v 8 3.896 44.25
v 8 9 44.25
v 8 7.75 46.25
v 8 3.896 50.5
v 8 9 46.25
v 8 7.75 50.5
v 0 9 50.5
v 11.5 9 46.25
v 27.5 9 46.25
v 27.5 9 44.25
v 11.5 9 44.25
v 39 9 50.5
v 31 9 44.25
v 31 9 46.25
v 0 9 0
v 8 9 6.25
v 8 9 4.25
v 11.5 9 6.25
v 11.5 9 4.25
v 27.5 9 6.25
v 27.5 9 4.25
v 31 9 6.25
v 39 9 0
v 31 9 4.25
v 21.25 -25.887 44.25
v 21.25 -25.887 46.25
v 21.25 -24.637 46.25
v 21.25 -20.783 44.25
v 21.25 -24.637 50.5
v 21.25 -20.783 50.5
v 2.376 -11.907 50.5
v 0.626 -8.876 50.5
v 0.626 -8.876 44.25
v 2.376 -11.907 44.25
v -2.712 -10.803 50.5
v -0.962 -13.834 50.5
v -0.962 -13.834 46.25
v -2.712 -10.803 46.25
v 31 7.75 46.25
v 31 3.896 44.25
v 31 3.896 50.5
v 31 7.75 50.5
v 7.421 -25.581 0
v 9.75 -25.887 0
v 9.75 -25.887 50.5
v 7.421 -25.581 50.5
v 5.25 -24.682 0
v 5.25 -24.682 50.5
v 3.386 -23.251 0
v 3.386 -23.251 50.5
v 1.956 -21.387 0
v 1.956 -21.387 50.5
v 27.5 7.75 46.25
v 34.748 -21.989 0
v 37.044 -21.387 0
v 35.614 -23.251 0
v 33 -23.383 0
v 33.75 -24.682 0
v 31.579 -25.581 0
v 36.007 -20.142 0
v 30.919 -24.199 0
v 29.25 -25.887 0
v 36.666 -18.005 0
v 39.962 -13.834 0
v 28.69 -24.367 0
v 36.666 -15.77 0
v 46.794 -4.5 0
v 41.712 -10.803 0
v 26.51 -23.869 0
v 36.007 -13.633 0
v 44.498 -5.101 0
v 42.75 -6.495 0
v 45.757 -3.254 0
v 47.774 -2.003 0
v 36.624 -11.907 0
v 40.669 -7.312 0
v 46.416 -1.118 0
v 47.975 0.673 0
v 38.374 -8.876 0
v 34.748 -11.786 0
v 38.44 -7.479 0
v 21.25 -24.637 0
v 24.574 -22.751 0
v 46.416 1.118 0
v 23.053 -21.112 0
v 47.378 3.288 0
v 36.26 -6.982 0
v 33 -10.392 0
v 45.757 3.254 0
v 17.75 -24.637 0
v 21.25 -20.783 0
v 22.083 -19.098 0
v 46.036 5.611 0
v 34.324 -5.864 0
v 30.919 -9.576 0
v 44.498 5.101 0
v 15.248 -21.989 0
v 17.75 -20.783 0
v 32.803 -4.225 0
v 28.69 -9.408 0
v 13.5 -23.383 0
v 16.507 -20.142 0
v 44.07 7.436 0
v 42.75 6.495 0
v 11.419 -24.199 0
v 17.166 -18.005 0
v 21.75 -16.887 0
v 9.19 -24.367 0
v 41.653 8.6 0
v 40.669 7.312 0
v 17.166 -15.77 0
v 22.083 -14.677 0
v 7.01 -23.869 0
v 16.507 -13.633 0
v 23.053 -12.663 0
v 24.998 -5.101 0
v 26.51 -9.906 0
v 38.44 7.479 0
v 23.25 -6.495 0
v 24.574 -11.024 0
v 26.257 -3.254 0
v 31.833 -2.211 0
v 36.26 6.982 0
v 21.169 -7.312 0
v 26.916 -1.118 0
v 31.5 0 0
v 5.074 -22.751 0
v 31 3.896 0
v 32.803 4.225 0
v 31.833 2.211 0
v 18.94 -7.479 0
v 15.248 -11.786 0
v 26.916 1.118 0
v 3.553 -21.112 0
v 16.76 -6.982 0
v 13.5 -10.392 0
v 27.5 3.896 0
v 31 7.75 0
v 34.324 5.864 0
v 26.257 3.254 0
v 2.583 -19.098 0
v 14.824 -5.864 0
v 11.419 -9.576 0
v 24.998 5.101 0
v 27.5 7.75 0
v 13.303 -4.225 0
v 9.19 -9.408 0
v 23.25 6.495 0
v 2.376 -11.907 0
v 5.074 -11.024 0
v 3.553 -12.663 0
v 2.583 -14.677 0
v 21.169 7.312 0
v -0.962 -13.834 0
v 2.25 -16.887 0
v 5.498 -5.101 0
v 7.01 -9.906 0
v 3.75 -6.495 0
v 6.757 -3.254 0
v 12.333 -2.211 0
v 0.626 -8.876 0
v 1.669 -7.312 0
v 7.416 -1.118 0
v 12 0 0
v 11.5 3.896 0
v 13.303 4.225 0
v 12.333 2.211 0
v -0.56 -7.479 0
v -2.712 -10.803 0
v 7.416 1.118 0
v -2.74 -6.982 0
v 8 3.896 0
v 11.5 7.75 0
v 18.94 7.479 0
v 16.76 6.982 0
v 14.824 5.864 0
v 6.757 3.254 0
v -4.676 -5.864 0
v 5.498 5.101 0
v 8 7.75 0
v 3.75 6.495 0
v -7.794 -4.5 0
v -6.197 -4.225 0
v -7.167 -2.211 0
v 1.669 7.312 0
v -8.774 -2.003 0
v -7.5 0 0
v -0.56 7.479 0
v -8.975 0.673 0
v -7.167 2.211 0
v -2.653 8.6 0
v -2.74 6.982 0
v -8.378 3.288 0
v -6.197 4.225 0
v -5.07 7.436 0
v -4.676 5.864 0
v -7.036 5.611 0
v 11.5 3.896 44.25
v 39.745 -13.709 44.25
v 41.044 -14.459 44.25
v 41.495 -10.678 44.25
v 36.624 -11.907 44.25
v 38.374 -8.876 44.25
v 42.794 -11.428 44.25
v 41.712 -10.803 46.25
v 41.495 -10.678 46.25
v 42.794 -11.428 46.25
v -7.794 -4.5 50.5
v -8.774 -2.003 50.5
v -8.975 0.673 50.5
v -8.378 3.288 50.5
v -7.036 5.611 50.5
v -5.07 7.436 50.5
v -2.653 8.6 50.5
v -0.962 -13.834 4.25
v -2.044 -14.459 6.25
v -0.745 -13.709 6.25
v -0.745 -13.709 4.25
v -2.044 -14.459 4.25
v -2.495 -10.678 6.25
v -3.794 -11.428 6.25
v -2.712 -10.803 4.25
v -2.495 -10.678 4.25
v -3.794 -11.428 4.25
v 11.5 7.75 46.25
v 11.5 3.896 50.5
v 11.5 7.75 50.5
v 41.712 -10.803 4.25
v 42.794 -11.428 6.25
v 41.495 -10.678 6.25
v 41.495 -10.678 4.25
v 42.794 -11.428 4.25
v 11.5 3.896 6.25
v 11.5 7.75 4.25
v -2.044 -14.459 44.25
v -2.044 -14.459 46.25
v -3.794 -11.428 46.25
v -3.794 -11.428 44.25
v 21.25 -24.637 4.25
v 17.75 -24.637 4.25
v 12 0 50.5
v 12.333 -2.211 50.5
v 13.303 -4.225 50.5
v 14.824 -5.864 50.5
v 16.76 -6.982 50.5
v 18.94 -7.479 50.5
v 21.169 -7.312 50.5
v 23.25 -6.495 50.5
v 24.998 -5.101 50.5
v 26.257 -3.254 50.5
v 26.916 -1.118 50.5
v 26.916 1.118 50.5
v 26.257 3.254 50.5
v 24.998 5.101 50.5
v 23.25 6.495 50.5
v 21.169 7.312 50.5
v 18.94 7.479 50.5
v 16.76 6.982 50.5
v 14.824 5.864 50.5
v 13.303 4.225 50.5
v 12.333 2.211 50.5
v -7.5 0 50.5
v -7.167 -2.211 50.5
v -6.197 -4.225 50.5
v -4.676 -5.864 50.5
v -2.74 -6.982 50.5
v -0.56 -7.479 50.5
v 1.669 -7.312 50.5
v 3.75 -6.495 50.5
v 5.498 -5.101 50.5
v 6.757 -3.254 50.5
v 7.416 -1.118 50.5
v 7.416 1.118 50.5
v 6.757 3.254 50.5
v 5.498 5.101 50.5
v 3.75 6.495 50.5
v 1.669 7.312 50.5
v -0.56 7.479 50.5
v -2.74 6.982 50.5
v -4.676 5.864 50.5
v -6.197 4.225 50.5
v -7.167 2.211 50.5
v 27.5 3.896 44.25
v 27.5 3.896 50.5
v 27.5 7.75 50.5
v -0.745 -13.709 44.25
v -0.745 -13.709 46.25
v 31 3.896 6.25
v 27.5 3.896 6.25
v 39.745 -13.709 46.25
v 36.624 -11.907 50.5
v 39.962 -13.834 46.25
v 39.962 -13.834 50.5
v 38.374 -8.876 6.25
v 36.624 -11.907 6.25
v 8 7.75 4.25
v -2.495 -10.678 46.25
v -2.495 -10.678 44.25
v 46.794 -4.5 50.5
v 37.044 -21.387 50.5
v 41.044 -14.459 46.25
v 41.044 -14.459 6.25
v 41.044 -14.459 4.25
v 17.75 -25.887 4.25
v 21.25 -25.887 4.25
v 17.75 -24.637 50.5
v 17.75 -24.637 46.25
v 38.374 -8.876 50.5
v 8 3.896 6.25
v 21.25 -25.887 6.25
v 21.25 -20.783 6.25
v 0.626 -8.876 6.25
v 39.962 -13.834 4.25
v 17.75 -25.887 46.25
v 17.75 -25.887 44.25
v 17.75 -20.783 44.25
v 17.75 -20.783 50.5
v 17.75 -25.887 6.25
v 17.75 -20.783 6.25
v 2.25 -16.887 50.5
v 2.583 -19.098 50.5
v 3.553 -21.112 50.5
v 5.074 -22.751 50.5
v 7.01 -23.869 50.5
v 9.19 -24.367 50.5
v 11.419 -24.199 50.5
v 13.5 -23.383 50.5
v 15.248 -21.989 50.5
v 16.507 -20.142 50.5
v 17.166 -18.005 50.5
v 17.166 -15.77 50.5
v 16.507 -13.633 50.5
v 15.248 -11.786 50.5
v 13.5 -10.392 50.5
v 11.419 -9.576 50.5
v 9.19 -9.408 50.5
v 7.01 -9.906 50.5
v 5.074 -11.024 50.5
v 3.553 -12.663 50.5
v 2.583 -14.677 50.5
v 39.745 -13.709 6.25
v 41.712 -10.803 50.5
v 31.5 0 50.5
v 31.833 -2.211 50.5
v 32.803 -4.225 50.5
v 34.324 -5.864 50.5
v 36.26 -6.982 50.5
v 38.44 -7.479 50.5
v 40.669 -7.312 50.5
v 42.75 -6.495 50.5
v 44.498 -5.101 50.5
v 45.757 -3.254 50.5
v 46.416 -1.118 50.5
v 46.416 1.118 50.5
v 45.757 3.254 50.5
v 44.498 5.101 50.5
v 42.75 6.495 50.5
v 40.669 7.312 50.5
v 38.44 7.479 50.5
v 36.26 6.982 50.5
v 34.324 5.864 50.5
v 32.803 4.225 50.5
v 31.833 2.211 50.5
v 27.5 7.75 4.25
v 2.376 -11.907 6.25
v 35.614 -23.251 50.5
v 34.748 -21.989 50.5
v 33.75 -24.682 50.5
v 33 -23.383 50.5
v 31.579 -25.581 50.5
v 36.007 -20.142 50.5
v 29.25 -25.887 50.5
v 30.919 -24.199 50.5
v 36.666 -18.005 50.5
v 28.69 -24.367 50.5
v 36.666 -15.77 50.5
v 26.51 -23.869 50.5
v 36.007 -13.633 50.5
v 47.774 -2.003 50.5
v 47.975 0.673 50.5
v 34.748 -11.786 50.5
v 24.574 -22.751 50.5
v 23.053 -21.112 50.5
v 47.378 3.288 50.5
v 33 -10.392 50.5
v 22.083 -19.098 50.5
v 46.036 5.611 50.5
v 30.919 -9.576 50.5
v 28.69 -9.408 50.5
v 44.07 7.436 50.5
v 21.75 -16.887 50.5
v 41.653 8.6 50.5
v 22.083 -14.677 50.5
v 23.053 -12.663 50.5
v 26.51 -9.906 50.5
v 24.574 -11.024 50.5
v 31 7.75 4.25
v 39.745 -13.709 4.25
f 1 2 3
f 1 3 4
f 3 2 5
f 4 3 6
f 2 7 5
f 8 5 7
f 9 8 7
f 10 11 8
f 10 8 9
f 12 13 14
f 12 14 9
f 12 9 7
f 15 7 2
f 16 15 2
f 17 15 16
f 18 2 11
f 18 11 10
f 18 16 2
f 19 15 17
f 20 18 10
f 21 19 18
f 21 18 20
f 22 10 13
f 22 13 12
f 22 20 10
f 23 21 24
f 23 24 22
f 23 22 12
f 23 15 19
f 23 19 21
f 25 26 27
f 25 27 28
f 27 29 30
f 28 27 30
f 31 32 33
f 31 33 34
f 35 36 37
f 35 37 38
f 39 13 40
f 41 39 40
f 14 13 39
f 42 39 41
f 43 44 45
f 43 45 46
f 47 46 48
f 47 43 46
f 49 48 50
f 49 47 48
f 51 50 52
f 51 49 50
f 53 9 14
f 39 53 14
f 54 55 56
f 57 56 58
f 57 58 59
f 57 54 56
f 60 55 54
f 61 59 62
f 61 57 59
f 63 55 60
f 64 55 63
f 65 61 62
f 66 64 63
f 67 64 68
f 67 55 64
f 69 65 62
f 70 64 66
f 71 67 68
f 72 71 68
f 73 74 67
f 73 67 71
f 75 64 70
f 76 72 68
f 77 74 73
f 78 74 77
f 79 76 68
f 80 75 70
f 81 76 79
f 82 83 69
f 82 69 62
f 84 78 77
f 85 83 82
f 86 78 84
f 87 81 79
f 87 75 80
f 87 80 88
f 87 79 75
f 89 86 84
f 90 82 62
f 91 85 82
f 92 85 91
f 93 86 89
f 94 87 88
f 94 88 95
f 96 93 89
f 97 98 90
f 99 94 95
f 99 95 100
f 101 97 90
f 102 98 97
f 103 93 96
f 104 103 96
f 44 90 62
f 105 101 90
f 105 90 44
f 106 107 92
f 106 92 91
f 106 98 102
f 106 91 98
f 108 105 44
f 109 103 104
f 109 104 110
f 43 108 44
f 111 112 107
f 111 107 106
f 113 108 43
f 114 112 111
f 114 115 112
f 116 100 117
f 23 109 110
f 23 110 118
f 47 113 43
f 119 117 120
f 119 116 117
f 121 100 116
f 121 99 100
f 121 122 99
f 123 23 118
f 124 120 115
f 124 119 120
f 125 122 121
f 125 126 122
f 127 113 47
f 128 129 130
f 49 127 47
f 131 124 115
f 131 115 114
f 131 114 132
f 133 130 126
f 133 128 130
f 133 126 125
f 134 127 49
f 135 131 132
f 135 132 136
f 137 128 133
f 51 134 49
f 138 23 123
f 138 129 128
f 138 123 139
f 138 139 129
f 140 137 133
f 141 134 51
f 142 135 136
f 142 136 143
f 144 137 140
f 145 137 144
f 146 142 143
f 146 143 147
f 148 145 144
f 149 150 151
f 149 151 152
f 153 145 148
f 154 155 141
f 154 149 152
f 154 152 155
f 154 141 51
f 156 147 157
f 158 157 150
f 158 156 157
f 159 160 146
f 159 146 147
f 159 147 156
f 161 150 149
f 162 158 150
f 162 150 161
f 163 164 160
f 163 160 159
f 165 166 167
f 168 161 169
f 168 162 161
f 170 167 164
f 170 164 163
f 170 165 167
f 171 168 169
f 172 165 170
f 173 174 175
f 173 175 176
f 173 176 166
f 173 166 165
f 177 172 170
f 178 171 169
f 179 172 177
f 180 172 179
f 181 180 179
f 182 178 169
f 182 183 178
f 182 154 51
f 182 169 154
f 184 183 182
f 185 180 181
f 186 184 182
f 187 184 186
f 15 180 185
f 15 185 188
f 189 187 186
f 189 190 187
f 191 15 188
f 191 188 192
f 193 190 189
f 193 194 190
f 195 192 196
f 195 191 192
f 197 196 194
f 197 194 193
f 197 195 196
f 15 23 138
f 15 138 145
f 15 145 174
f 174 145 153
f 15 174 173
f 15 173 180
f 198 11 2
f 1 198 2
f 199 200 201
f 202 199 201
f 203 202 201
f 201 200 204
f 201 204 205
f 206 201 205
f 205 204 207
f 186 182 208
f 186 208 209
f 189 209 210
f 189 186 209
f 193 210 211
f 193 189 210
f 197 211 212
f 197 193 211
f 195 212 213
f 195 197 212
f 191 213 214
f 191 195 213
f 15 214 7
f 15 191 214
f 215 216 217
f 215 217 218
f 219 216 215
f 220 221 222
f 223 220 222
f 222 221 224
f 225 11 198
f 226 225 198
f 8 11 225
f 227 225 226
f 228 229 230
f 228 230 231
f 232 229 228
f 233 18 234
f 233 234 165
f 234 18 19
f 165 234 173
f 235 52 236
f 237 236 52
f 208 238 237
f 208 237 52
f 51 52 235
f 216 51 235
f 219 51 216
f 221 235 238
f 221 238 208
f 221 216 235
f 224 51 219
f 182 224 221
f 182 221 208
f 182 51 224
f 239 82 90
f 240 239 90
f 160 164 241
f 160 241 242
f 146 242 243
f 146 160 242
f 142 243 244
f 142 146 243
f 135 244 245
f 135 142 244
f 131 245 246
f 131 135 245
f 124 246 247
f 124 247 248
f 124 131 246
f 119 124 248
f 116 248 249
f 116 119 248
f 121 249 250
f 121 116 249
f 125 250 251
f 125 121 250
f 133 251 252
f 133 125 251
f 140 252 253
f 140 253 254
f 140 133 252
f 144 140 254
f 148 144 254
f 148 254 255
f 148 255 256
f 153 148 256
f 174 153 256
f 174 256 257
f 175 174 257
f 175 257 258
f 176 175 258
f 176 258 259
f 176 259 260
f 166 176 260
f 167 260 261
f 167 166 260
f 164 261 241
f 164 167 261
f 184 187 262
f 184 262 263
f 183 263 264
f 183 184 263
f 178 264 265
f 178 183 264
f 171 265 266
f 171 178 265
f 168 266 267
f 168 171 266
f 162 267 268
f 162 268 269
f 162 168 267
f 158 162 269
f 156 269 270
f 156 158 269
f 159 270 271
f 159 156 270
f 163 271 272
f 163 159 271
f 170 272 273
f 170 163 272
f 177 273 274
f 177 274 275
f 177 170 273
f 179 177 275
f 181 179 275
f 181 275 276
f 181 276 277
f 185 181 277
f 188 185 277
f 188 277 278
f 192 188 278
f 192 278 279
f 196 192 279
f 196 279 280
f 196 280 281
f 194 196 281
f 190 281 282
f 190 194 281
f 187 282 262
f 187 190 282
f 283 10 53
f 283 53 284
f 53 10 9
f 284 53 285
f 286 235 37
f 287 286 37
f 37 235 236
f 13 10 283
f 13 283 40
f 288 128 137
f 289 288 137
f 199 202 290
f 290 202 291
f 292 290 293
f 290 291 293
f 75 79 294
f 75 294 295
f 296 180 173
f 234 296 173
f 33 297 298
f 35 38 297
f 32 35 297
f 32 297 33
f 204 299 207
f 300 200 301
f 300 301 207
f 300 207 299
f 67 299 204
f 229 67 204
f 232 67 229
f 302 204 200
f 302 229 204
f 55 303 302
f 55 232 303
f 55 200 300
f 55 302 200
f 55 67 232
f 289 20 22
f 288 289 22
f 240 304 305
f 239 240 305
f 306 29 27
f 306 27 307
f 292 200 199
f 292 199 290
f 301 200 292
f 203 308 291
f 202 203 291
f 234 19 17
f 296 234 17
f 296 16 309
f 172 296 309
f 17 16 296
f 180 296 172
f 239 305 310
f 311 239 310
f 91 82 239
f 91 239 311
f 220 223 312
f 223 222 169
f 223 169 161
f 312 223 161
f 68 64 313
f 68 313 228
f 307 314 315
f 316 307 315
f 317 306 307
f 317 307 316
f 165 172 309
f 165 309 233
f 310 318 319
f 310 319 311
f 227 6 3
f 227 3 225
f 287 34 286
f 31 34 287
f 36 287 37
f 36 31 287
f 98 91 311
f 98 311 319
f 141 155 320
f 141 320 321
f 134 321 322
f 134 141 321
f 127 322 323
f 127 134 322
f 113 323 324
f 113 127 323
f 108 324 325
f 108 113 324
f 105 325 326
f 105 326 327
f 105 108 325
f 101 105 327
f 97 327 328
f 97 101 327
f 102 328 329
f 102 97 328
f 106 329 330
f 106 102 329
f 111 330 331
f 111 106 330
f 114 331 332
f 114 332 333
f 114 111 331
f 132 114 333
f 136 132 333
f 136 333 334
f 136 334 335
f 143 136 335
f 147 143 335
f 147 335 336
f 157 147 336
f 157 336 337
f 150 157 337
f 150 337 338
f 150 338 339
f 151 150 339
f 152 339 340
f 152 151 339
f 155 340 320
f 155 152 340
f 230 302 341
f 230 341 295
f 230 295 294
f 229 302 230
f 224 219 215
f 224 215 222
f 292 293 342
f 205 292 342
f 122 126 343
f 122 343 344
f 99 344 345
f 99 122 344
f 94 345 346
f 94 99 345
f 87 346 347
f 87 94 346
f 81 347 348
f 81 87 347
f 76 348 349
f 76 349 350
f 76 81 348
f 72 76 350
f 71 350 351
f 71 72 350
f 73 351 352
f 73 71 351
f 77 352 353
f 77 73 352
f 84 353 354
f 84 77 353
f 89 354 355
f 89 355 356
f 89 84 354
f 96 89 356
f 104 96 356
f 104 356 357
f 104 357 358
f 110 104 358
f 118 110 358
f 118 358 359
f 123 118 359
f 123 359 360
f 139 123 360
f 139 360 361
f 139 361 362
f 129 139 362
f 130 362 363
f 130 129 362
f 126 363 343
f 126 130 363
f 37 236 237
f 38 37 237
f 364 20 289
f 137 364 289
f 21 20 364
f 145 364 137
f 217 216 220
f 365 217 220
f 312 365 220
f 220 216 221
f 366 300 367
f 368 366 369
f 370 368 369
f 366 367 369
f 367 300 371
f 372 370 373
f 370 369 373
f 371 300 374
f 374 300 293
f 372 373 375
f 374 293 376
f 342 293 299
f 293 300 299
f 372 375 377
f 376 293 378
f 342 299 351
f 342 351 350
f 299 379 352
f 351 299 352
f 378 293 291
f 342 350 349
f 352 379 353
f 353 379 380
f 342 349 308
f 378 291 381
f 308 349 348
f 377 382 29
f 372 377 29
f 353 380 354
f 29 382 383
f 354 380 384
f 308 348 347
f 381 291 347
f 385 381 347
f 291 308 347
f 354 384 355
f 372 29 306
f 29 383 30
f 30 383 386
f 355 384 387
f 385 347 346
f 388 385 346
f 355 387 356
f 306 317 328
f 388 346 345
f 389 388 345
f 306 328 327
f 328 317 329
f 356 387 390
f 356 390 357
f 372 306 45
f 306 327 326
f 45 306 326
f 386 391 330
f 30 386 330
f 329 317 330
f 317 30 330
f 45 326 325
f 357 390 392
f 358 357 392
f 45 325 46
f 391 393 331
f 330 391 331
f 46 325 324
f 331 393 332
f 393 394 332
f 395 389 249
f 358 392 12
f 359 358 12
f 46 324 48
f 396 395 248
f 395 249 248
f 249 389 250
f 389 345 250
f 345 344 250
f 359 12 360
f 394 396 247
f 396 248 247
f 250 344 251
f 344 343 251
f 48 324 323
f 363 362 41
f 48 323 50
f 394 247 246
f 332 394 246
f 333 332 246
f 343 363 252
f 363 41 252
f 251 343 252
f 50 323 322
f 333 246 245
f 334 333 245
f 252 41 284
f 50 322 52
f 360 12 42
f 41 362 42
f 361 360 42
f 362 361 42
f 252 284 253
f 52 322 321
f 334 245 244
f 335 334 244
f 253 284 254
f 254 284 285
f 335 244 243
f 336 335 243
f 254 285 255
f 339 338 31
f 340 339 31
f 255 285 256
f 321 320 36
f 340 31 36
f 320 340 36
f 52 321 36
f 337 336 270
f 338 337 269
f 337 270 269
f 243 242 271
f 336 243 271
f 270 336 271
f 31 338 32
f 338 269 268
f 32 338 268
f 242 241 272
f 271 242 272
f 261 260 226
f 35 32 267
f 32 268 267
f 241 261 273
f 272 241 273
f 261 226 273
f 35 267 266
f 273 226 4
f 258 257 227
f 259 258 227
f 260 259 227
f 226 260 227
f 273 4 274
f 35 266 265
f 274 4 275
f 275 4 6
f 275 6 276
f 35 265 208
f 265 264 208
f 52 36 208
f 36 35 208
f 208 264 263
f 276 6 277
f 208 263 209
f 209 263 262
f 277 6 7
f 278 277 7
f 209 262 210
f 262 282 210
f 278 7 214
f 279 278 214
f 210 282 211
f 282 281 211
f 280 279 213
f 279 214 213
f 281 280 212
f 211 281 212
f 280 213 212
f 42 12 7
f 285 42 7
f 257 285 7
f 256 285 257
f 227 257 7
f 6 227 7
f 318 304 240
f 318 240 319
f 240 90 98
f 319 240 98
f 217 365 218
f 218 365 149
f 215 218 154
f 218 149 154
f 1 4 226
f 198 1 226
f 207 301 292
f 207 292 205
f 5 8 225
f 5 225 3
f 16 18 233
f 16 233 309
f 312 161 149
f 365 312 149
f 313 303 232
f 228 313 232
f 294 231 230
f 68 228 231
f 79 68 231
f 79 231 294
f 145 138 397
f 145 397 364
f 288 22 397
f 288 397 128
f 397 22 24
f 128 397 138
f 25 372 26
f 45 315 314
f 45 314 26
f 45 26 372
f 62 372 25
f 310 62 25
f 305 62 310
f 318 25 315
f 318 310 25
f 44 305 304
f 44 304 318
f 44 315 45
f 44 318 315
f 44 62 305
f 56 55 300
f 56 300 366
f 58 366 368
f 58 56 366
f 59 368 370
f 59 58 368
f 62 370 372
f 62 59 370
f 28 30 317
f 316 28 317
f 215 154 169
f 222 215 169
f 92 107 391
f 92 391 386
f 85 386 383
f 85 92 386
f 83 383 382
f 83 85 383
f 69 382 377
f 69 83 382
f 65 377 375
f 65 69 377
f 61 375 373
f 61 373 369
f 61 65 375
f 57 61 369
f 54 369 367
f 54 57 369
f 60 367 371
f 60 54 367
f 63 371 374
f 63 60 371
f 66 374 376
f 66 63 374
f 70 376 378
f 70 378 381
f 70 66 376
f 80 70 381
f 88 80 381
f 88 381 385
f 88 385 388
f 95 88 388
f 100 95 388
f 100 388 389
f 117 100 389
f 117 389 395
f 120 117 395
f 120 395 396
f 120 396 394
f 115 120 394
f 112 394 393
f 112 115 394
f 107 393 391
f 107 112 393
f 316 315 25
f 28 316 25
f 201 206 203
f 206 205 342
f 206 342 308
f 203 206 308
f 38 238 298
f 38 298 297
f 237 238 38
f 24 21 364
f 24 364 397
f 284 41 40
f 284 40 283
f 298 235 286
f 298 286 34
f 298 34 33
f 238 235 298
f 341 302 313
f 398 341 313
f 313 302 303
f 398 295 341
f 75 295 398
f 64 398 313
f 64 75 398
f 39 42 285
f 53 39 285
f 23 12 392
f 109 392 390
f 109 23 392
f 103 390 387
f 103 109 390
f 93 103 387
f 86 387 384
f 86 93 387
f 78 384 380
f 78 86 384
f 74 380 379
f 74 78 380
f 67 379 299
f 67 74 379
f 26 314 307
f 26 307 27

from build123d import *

# Parameters (mm, degrees)
SKETCH1_R               = 7.5
BOSS_EXTRUDE1_DEPTH     = 50.5
SKETCH2_W               = 2
SKETCH2_H               = 3.5
CUT_EXTRUDE1_DEPTH      = 1.5
SKETCH3_W               = 3.5
SKETCH3_H               = 2
CUT_EXTRUDE2_DEPTH      = 1.5
SKETCH4_W               = 3.5
SKETCH4_H               = 2
CUT_EXTRUDE3_DEPTH      = 1.5
SKETCH5_W               = 3.5
SKETCH5_H               = 3.854101966
CUT_EXTRUDE4_DEPTH      = 6.25
MIRROR3_COPY_1_SKETCH_W = 2
MIRROR3_COPY_1_SKETCH_H = 3.5
MIRROR3_COPY_1_DEPTH    = 1.5
MIRROR3_COPY_2_SKETCH_W = 3.5
MIRROR3_COPY_2_SKETCH_H = 2
MIRROR3_COPY_2_DEPTH    = 1.5
MIRROR3_COPY_3_SKETCH_W = 3.5
MIRROR3_COPY_3_SKETCH_H = 2
MIRROR3_COPY_3_DEPTH    = 1.5
MIRROR3_COPY_4_SKETCH_W = 3.5
MIRROR3_COPY_4_SKETCH_H = 3.854101966
MIRROR3_COPY_4_DEPTH    = 6.25


with BuildPart() as part:
    # Sketch1 → Boss-Extrude1 (new body)
    with BuildSketch(Plane.XY):
        with BuildLine():
            Line((0, 9), (39, 9))
            ThreePointArc((39, 9), (46.794228634, 4.5), (46.794228634, -4.5))
            Line((46.794228634, -4.5), (37.044228634, -21.387495374))
            ThreePointArc((37.044228634, -21.387495374), (33.75, -24.681724008), (29.25, -25.887495374))
            Line((29.25, -25.887495374), (9.75, -25.887495374))
            ThreePointArc((9.75, -25.887495374), (5.25, -24.681724008), (1.955771366, -21.387495374))
            Line((1.955771366, -21.387495374), (-7.794228634, -4.5))
            ThreePointArc((-7.794228634, -4.5), (-7.794228634, 4.5), (0, 9))
        make_face()
        with Locations(Location((0, 0, 0), (0, 0, 180))):
            Circle(SKETCH1_R, mode=Mode.SUBTRACT)
        with Locations(Location((9.75, -16.887495374, 0), (0, 0, 180))):
            Circle(SKETCH1_R, mode=Mode.SUBTRACT)
        with Locations(Location((19.5, 0, 0), (0, 0, 180))):
            Circle(SKETCH1_R, mode=Mode.SUBTRACT)
        with Locations(Location((39, 0, 0), (0, 0, 180))):
            Circle(SKETCH1_R, mode=Mode.SUBTRACT)
        with Locations(Location((29.25, -16.887495374, 0), (0, 0, 180))):
            Circle(SKETCH1_R, mode=Mode.SUBTRACT)
    extrude(amount=BOSS_EXTRUDE1_DEPTH)

    # Sketch2 → Cut-Extrude1 (cut)
    with BuildSketch(Plane(origin=(37.044228634, -21.387495374, 0), x_dir=(0, 0, -1), z_dir=(0.8660254037844384, -0.5000000000000007, 0))):
        with Locations((-5.25, 9.75)):
            Rectangle(SKETCH2_W, SKETCH2_H)
    cut_extrude1 = extrude(amount=-CUT_EXTRUDE1_DEPTH, mode=Mode.SUBTRACT)

    # Sketch3 → Cut-Extrude2 (cut)
    with BuildSketch(Plane(origin=(0, 9, 0), x_dir=(1, 0, 0), z_dir=(0, 1, 0))):
        with Locations((29.25, -5.25)):
            Rectangle(SKETCH3_W, SKETCH3_H)
    cut_extrude2 = extrude(amount=-CUT_EXTRUDE2_DEPTH, mode=Mode.SUBTRACT)

    # Sketch4 → Cut-Extrude3 (cut)
    with BuildSketch(Plane.XZ.offset(25.887495374)):
        with Locations((19.5, 5.25)):
            Rectangle(SKETCH4_W, SKETCH4_H)
    cut_extrude3 = extrude(amount=-CUT_EXTRUDE3_DEPTH, mode=Mode.SUBTRACT)

    # Sketch5 → Cut-Extrude4 (cut)
    with BuildSketch(Plane(origin=(0, 0, 0), x_dir=(-1, 0, 0), z_dir=(0, 0, -1))):
        with Locations((-29.25, 5.822949017)):
            Rectangle(SKETCH5_W, SKETCH5_H)
        with Locations((-19.5, -22.710444391)):
            Rectangle(SKETCH5_W, SKETCH5_H)
        Polygon((-38.373946668, -8.876152247), (-36.623946668, -11.90724116), (-39.961696879, -13.834292144), (-41.711696879, -10.80320323), align=None)
    cut_extrude4 = extrude(amount=-CUT_EXTRUDE4_DEPTH, mode=Mode.SUBTRACT)

    # Mirror2: Cut-Extrude1, Cut-Extrude2, Cut-Extrude3, Cut-Extrude4 across plane
    add(cut_extrude1.mirror(Plane(origin=(19.5, 0, 0), x_dir=(0, 0, 1), z_dir=(1, 0, 0))), mode=Mode.SUBTRACT)
    add(cut_extrude2.mirror(Plane(origin=(19.5, 0, 0), x_dir=(0, 0, 1), z_dir=(1, 0, 0))), mode=Mode.SUBTRACT)
    add(cut_extrude3.mirror(Plane(origin=(19.5, 0, 0), x_dir=(0, 0, 1), z_dir=(1, 0, 0))), mode=Mode.SUBTRACT)
    add(cut_extrude4.mirror(Plane(origin=(19.5, 0, 0), x_dir=(0, 0, 1), z_dir=(1, 0, 0))), mode=Mode.SUBTRACT)

    # Mirror3: Cut-Extrude1, Cut-Extrude2, Cut-Extrude3, Cut-Extrude4 across plane
    add(cut_extrude1.mirror(Plane(origin=(0, 0, 25.25), x_dir=(1, 0, 0), z_dir=(0, 0, -1))), mode=Mode.SUBTRACT)
    add(cut_extrude2.mirror(Plane(origin=(0, 0, 25.25), x_dir=(1, 0, 0), z_dir=(0, 0, -1))), mode=Mode.SUBTRACT)
    add(cut_extrude3.mirror(Plane(origin=(0, 0, 25.25), x_dir=(1, 0, 0), z_dir=(0, 0, -1))), mode=Mode.SUBTRACT)
    add(cut_extrude4.mirror(Plane(origin=(0, 0, 25.25), x_dir=(1, 0, 0), z_dir=(0, 0, -1))), mode=Mode.SUBTRACT)

    # Mirror3 copy 1 sketch → Mirror3 copy 1 (cut)
    with BuildSketch(Plane(origin=(1.955771366, -21.387495374, 50.5), x_dir=(0, 0, 1), z_dir=(-0.8660254037844385, -0.5000000000000004, 0))):
        with Locations((-5.25, 9.75)):
            Rectangle(MIRROR3_COPY_1_SKETCH_W, MIRROR3_COPY_1_SKETCH_H)
    extrude(amount=-MIRROR3_COPY_1_DEPTH, mode=Mode.SUBTRACT)

    # Mirror3 copy 2 sketch → Mirror3 copy 2 (cut)
    with BuildSketch(Plane(origin=(39, 9, 50.5), x_dir=(-1, 0, 0), z_dir=(0, 1, 0))):
        with Locations((29.25, -5.25)):
            Rectangle(MIRROR3_COPY_2_SKETCH_W, MIRROR3_COPY_2_SKETCH_H)
    extrude(amount=-MIRROR3_COPY_2_DEPTH, mode=Mode.SUBTRACT)

    # Mirror3 copy 3 sketch → Mirror3 copy 3 (cut)
    with BuildSketch(Plane(origin=(39, -25.887495374, 50.5), x_dir=(-1, 0, 0), z_dir=(0, -1, 0))):
        with Locations((19.5, 5.25)):
            Rectangle(MIRROR3_COPY_3_SKETCH_W, MIRROR3_COPY_3_SKETCH_H)
    extrude(amount=-MIRROR3_COPY_3_DEPTH, mode=Mode.SUBTRACT)

    # Mirror3 copy 4 sketch → Mirror3 copy 4 (cut)
    with BuildSketch(Plane(origin=(39, 0, 50.5), x_dir=(1, 0, 0), z_dir=(0, 0, 1))):
        with Locations((-29.25, 5.822949017)):
            Rectangle(MIRROR3_COPY_4_SKETCH_W, MIRROR3_COPY_4_SKETCH_H)
        with Locations((-19.5, -22.710444391)):
            Rectangle(MIRROR3_COPY_4_SKETCH_W, MIRROR3_COPY_4_SKETCH_H)
        Polygon((-38.373946668, -8.876152247), (-36.623946668, -11.90724116), (-39.961696879, -13.834292144), (-41.711696879, -10.80320323), align=None)
    extrude(amount=-MIRROR3_COPY_4_DEPTH, mode=Mode.SUBTRACT)


solid = part.part
